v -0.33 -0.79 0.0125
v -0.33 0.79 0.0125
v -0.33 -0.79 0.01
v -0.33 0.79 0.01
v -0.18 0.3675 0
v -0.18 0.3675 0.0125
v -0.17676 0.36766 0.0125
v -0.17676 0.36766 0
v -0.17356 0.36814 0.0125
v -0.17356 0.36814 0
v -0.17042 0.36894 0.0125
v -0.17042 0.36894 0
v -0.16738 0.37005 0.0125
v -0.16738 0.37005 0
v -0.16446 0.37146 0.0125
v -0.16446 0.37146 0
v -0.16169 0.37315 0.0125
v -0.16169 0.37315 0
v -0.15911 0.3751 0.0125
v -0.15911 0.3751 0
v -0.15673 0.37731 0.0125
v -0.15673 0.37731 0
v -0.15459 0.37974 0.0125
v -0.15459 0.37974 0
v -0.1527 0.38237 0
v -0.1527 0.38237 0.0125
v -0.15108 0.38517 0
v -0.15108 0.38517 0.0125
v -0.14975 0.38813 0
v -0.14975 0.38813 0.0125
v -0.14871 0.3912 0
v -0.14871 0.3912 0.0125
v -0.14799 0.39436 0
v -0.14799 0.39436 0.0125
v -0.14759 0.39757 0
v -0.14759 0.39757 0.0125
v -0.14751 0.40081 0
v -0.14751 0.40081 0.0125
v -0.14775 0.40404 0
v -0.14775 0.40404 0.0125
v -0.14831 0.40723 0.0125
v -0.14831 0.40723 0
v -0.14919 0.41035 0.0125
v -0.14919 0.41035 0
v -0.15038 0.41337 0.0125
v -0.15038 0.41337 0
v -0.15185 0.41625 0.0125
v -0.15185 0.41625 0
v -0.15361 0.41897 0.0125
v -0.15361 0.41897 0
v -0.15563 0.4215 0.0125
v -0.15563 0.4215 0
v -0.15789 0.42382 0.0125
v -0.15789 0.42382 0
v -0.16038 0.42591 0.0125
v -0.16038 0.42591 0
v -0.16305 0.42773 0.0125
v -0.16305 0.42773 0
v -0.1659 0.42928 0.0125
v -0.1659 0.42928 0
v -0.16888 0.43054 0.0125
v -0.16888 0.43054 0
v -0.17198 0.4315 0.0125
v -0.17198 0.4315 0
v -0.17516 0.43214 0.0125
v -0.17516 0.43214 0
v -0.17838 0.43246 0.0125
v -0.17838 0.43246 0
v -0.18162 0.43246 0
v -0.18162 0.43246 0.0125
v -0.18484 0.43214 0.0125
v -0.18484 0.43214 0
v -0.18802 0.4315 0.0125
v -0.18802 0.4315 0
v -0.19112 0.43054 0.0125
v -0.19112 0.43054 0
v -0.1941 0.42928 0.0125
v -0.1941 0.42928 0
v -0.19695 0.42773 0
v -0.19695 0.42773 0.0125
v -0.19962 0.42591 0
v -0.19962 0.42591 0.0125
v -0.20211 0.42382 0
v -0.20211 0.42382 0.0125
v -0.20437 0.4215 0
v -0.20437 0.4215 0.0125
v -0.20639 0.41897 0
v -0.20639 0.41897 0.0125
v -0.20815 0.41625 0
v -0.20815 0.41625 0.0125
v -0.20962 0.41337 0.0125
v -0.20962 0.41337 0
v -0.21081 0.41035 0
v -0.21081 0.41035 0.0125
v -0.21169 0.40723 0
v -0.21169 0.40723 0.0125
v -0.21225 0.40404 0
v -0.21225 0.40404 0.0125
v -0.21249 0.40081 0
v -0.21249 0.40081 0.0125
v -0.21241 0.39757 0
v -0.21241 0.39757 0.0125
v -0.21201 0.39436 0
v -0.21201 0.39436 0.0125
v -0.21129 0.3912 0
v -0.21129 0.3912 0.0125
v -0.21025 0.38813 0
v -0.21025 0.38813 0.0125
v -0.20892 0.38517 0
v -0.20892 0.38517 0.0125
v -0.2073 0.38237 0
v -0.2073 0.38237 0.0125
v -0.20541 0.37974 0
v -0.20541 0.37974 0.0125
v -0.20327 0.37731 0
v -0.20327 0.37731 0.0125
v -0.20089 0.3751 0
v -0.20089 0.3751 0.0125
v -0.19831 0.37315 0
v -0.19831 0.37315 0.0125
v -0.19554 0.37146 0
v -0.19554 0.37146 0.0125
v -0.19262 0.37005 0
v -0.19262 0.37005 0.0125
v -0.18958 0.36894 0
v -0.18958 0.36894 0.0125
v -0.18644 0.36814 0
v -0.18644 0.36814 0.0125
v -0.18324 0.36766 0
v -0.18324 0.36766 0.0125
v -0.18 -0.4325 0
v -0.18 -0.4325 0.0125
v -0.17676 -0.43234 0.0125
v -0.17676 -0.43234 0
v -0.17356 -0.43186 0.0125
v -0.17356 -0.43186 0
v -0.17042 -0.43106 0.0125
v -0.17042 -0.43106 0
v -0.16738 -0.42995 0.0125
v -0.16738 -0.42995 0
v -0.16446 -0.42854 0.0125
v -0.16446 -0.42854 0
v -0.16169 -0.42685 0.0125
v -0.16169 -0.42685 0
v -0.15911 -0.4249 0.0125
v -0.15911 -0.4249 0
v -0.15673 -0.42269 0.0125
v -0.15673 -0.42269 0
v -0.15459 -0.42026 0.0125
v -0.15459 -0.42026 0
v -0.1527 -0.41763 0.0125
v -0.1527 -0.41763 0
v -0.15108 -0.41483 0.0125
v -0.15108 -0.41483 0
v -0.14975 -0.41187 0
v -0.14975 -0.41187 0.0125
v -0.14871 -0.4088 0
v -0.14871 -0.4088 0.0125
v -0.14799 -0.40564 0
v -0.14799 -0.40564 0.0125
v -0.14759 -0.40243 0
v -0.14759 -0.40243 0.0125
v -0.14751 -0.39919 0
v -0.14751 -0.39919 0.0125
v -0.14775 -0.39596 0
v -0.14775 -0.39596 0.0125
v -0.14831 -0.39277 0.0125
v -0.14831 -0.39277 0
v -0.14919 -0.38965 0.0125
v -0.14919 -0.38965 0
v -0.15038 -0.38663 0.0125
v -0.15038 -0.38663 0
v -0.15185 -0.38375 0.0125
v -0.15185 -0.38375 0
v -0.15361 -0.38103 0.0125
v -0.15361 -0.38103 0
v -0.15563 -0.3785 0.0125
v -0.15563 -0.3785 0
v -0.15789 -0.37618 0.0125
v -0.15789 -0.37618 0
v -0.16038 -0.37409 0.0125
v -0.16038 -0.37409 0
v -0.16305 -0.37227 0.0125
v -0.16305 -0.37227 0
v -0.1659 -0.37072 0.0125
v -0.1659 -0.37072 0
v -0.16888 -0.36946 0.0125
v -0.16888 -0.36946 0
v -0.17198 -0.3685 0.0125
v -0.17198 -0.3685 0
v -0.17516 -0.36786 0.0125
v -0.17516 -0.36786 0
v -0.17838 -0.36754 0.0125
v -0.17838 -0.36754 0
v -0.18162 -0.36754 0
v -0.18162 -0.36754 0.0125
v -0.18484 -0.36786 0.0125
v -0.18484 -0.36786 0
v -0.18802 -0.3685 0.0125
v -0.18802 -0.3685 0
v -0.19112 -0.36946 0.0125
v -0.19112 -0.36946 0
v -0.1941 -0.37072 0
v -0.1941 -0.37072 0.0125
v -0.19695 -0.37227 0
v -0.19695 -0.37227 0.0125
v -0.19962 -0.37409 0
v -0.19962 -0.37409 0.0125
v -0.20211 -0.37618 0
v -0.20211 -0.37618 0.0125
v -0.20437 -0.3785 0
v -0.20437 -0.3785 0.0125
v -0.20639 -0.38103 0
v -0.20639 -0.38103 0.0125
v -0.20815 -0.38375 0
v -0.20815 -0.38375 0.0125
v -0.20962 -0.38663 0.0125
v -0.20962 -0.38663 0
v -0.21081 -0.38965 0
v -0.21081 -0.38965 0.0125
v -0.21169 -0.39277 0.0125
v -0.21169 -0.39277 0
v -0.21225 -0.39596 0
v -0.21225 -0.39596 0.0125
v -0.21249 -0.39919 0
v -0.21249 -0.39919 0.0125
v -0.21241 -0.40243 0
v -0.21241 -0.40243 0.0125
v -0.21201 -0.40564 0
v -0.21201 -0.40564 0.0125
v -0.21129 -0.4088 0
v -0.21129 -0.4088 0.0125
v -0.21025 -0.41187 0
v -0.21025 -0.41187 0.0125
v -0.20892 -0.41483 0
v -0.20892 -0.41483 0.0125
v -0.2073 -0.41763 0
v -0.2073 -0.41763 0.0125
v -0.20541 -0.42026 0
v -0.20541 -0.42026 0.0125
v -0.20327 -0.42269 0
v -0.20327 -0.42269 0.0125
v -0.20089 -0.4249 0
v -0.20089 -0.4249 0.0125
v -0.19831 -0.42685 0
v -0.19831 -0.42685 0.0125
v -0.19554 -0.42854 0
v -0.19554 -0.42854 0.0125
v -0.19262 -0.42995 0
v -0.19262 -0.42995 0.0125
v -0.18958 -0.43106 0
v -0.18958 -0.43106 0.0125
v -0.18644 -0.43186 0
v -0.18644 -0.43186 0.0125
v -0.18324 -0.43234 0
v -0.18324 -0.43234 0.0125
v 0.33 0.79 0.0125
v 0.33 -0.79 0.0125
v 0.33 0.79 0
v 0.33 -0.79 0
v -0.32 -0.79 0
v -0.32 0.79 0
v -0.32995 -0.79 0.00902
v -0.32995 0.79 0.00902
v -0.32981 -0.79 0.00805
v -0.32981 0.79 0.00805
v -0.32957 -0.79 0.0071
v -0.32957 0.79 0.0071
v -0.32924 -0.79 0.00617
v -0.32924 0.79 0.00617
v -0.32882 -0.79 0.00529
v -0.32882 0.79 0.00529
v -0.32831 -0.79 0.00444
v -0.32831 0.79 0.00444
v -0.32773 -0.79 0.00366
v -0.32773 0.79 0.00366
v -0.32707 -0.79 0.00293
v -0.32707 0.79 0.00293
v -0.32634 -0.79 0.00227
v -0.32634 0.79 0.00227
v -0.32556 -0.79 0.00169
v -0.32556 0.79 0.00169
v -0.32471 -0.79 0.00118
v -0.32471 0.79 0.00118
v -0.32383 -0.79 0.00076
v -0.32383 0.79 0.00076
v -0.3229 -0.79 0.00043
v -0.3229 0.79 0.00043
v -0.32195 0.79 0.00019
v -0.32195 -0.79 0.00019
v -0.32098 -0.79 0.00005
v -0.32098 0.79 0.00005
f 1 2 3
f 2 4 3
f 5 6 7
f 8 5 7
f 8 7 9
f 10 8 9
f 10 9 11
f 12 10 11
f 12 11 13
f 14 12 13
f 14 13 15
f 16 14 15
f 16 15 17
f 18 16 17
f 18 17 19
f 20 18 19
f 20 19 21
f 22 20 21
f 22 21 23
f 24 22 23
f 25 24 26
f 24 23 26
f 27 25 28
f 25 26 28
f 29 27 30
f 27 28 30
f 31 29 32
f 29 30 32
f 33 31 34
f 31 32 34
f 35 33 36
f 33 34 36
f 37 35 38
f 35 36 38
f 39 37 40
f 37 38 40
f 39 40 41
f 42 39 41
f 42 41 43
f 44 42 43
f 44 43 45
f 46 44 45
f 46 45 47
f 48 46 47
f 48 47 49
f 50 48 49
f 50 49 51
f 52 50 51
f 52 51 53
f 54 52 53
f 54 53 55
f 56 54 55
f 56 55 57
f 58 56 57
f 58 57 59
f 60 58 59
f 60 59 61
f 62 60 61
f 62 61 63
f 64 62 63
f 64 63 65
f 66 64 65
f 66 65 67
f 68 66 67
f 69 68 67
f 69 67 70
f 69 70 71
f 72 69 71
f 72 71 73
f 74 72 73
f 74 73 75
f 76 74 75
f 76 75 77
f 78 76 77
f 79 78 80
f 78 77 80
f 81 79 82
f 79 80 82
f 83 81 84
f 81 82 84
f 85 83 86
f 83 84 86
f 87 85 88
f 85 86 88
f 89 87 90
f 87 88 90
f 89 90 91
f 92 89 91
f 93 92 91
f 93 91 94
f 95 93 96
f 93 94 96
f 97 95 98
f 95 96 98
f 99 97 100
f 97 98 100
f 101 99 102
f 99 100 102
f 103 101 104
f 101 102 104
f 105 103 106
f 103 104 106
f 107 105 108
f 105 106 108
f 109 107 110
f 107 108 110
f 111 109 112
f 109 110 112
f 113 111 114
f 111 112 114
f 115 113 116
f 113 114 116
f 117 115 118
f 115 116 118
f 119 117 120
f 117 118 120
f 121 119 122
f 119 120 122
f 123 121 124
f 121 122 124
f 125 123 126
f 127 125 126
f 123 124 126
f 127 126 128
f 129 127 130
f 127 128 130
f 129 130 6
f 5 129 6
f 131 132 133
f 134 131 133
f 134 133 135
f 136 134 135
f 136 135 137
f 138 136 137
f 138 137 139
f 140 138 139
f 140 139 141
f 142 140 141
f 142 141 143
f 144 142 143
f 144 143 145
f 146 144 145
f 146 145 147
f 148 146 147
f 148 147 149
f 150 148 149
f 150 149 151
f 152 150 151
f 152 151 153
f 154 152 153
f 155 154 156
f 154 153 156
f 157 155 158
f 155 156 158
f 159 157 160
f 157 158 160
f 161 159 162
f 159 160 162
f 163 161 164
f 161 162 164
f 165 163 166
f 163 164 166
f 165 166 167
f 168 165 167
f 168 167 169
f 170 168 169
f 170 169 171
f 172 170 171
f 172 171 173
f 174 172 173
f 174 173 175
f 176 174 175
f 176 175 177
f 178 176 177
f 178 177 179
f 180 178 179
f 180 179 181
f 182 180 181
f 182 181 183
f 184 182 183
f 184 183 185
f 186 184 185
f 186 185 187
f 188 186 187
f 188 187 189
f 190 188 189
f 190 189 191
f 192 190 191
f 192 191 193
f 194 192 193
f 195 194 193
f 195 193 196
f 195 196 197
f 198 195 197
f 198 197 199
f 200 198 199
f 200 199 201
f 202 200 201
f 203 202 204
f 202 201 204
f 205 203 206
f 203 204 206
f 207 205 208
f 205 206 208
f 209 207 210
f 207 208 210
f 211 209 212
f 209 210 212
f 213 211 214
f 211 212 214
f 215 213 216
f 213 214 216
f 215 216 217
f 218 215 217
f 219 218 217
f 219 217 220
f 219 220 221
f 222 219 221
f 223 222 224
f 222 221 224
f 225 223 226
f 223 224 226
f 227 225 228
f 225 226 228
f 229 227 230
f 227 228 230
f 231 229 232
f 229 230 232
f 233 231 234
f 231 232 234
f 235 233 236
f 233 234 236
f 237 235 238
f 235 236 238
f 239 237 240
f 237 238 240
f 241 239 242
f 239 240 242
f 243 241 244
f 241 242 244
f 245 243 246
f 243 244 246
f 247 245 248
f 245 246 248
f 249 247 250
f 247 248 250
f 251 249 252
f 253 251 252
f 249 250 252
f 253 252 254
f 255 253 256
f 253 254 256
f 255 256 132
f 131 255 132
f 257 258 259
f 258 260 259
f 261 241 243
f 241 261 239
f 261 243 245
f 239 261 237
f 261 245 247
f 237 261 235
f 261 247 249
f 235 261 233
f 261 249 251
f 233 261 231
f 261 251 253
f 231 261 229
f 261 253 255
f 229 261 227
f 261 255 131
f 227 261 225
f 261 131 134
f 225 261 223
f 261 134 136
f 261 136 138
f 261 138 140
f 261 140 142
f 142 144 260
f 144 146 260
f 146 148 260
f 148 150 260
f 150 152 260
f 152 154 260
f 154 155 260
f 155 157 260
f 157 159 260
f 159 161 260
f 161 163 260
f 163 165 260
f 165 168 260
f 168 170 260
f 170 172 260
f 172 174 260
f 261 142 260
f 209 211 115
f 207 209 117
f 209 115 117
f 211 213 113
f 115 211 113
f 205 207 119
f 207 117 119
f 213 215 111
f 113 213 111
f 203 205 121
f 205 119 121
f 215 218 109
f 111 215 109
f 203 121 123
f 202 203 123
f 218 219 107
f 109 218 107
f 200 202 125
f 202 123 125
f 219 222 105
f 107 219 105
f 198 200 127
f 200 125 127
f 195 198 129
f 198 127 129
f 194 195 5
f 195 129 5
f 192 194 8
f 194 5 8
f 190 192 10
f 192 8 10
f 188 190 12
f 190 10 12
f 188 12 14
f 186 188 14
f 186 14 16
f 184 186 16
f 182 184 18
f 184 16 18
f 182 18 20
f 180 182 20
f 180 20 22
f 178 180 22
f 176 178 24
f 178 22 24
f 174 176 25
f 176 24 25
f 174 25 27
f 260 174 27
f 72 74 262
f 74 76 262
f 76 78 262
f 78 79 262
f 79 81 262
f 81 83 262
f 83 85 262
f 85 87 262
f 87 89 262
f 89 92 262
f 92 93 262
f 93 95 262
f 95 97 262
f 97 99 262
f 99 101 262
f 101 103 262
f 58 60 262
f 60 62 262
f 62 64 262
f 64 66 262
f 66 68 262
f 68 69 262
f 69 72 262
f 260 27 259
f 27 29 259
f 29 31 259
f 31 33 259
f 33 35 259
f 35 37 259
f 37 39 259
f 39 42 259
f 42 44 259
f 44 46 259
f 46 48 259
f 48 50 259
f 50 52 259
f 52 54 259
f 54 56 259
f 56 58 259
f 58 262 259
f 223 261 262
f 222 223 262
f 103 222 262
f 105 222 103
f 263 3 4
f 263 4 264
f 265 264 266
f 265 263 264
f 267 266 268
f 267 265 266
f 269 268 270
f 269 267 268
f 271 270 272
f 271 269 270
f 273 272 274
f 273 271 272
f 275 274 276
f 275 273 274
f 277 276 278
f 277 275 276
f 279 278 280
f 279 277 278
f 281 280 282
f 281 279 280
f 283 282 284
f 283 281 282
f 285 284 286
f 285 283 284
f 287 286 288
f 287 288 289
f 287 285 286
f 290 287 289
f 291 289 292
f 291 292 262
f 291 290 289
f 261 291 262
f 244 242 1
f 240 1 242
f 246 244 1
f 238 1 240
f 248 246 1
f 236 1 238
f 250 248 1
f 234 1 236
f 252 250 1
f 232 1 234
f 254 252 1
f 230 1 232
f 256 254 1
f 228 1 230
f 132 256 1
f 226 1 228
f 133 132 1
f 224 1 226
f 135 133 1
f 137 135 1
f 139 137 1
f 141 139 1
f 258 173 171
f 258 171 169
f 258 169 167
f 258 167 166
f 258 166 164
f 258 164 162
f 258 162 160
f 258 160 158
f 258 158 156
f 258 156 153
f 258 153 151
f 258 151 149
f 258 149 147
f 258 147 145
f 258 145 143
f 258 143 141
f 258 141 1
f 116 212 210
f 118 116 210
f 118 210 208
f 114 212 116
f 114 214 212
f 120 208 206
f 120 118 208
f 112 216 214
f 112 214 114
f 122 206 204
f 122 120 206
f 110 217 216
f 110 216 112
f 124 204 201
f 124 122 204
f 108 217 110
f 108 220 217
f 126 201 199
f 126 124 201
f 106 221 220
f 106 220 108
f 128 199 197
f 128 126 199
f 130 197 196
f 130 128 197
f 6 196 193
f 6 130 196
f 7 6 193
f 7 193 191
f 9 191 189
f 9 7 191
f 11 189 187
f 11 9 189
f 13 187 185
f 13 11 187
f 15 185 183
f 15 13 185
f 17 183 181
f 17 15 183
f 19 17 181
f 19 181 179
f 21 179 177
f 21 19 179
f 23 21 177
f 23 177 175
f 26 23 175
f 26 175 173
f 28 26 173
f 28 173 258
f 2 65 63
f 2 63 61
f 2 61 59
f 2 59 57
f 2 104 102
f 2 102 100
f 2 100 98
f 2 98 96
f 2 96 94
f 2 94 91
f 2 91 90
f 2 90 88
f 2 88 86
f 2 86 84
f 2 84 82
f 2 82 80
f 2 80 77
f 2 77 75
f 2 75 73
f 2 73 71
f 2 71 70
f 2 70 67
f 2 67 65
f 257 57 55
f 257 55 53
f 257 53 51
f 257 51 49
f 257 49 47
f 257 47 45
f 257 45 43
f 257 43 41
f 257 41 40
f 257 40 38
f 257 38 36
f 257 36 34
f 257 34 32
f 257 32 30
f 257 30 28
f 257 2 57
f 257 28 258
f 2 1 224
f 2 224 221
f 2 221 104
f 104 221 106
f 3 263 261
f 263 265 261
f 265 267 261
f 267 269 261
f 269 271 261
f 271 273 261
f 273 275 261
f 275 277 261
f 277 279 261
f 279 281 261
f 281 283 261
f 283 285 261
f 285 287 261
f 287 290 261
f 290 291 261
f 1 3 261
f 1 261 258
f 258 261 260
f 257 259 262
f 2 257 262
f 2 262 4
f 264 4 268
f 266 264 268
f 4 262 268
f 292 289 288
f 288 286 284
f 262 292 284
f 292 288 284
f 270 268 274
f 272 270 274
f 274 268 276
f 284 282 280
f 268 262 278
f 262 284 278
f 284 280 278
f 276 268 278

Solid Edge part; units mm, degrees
sketch "Sketch1" plane through (0, 0, 0) normal (0, 0, 1) x (1, 0, 0)
  line L0 (-0.33, -0.79) -> (0.33, -0.79)
  line L1 (0.33, -0.79) -> (0.33, 0.79)
  line L2 (0.33, 0.79) -> (-0.33, 0.79)
  line L3 (-0.33, 0.79) -> (-0.33, -0.79)
  dimension "D1" = 0.66
  dimension "D2" = 1.58
extrude "Protrusion1" add sketch "Sketch1" along normal blind 0.0125
fillet "Verrundung_1" radius 0.01 1 edges at (-0.33, 0, 0)
hole "Bohrung_1" at (-0.18, -0.4, 0.0125) direction (0, 0, -1) diameter 0.065 end up to next
hole "Hole1" at (-0.18, 0.4, 0.0125) direction (0, 0, -1) diameter 0.065 end up to next
